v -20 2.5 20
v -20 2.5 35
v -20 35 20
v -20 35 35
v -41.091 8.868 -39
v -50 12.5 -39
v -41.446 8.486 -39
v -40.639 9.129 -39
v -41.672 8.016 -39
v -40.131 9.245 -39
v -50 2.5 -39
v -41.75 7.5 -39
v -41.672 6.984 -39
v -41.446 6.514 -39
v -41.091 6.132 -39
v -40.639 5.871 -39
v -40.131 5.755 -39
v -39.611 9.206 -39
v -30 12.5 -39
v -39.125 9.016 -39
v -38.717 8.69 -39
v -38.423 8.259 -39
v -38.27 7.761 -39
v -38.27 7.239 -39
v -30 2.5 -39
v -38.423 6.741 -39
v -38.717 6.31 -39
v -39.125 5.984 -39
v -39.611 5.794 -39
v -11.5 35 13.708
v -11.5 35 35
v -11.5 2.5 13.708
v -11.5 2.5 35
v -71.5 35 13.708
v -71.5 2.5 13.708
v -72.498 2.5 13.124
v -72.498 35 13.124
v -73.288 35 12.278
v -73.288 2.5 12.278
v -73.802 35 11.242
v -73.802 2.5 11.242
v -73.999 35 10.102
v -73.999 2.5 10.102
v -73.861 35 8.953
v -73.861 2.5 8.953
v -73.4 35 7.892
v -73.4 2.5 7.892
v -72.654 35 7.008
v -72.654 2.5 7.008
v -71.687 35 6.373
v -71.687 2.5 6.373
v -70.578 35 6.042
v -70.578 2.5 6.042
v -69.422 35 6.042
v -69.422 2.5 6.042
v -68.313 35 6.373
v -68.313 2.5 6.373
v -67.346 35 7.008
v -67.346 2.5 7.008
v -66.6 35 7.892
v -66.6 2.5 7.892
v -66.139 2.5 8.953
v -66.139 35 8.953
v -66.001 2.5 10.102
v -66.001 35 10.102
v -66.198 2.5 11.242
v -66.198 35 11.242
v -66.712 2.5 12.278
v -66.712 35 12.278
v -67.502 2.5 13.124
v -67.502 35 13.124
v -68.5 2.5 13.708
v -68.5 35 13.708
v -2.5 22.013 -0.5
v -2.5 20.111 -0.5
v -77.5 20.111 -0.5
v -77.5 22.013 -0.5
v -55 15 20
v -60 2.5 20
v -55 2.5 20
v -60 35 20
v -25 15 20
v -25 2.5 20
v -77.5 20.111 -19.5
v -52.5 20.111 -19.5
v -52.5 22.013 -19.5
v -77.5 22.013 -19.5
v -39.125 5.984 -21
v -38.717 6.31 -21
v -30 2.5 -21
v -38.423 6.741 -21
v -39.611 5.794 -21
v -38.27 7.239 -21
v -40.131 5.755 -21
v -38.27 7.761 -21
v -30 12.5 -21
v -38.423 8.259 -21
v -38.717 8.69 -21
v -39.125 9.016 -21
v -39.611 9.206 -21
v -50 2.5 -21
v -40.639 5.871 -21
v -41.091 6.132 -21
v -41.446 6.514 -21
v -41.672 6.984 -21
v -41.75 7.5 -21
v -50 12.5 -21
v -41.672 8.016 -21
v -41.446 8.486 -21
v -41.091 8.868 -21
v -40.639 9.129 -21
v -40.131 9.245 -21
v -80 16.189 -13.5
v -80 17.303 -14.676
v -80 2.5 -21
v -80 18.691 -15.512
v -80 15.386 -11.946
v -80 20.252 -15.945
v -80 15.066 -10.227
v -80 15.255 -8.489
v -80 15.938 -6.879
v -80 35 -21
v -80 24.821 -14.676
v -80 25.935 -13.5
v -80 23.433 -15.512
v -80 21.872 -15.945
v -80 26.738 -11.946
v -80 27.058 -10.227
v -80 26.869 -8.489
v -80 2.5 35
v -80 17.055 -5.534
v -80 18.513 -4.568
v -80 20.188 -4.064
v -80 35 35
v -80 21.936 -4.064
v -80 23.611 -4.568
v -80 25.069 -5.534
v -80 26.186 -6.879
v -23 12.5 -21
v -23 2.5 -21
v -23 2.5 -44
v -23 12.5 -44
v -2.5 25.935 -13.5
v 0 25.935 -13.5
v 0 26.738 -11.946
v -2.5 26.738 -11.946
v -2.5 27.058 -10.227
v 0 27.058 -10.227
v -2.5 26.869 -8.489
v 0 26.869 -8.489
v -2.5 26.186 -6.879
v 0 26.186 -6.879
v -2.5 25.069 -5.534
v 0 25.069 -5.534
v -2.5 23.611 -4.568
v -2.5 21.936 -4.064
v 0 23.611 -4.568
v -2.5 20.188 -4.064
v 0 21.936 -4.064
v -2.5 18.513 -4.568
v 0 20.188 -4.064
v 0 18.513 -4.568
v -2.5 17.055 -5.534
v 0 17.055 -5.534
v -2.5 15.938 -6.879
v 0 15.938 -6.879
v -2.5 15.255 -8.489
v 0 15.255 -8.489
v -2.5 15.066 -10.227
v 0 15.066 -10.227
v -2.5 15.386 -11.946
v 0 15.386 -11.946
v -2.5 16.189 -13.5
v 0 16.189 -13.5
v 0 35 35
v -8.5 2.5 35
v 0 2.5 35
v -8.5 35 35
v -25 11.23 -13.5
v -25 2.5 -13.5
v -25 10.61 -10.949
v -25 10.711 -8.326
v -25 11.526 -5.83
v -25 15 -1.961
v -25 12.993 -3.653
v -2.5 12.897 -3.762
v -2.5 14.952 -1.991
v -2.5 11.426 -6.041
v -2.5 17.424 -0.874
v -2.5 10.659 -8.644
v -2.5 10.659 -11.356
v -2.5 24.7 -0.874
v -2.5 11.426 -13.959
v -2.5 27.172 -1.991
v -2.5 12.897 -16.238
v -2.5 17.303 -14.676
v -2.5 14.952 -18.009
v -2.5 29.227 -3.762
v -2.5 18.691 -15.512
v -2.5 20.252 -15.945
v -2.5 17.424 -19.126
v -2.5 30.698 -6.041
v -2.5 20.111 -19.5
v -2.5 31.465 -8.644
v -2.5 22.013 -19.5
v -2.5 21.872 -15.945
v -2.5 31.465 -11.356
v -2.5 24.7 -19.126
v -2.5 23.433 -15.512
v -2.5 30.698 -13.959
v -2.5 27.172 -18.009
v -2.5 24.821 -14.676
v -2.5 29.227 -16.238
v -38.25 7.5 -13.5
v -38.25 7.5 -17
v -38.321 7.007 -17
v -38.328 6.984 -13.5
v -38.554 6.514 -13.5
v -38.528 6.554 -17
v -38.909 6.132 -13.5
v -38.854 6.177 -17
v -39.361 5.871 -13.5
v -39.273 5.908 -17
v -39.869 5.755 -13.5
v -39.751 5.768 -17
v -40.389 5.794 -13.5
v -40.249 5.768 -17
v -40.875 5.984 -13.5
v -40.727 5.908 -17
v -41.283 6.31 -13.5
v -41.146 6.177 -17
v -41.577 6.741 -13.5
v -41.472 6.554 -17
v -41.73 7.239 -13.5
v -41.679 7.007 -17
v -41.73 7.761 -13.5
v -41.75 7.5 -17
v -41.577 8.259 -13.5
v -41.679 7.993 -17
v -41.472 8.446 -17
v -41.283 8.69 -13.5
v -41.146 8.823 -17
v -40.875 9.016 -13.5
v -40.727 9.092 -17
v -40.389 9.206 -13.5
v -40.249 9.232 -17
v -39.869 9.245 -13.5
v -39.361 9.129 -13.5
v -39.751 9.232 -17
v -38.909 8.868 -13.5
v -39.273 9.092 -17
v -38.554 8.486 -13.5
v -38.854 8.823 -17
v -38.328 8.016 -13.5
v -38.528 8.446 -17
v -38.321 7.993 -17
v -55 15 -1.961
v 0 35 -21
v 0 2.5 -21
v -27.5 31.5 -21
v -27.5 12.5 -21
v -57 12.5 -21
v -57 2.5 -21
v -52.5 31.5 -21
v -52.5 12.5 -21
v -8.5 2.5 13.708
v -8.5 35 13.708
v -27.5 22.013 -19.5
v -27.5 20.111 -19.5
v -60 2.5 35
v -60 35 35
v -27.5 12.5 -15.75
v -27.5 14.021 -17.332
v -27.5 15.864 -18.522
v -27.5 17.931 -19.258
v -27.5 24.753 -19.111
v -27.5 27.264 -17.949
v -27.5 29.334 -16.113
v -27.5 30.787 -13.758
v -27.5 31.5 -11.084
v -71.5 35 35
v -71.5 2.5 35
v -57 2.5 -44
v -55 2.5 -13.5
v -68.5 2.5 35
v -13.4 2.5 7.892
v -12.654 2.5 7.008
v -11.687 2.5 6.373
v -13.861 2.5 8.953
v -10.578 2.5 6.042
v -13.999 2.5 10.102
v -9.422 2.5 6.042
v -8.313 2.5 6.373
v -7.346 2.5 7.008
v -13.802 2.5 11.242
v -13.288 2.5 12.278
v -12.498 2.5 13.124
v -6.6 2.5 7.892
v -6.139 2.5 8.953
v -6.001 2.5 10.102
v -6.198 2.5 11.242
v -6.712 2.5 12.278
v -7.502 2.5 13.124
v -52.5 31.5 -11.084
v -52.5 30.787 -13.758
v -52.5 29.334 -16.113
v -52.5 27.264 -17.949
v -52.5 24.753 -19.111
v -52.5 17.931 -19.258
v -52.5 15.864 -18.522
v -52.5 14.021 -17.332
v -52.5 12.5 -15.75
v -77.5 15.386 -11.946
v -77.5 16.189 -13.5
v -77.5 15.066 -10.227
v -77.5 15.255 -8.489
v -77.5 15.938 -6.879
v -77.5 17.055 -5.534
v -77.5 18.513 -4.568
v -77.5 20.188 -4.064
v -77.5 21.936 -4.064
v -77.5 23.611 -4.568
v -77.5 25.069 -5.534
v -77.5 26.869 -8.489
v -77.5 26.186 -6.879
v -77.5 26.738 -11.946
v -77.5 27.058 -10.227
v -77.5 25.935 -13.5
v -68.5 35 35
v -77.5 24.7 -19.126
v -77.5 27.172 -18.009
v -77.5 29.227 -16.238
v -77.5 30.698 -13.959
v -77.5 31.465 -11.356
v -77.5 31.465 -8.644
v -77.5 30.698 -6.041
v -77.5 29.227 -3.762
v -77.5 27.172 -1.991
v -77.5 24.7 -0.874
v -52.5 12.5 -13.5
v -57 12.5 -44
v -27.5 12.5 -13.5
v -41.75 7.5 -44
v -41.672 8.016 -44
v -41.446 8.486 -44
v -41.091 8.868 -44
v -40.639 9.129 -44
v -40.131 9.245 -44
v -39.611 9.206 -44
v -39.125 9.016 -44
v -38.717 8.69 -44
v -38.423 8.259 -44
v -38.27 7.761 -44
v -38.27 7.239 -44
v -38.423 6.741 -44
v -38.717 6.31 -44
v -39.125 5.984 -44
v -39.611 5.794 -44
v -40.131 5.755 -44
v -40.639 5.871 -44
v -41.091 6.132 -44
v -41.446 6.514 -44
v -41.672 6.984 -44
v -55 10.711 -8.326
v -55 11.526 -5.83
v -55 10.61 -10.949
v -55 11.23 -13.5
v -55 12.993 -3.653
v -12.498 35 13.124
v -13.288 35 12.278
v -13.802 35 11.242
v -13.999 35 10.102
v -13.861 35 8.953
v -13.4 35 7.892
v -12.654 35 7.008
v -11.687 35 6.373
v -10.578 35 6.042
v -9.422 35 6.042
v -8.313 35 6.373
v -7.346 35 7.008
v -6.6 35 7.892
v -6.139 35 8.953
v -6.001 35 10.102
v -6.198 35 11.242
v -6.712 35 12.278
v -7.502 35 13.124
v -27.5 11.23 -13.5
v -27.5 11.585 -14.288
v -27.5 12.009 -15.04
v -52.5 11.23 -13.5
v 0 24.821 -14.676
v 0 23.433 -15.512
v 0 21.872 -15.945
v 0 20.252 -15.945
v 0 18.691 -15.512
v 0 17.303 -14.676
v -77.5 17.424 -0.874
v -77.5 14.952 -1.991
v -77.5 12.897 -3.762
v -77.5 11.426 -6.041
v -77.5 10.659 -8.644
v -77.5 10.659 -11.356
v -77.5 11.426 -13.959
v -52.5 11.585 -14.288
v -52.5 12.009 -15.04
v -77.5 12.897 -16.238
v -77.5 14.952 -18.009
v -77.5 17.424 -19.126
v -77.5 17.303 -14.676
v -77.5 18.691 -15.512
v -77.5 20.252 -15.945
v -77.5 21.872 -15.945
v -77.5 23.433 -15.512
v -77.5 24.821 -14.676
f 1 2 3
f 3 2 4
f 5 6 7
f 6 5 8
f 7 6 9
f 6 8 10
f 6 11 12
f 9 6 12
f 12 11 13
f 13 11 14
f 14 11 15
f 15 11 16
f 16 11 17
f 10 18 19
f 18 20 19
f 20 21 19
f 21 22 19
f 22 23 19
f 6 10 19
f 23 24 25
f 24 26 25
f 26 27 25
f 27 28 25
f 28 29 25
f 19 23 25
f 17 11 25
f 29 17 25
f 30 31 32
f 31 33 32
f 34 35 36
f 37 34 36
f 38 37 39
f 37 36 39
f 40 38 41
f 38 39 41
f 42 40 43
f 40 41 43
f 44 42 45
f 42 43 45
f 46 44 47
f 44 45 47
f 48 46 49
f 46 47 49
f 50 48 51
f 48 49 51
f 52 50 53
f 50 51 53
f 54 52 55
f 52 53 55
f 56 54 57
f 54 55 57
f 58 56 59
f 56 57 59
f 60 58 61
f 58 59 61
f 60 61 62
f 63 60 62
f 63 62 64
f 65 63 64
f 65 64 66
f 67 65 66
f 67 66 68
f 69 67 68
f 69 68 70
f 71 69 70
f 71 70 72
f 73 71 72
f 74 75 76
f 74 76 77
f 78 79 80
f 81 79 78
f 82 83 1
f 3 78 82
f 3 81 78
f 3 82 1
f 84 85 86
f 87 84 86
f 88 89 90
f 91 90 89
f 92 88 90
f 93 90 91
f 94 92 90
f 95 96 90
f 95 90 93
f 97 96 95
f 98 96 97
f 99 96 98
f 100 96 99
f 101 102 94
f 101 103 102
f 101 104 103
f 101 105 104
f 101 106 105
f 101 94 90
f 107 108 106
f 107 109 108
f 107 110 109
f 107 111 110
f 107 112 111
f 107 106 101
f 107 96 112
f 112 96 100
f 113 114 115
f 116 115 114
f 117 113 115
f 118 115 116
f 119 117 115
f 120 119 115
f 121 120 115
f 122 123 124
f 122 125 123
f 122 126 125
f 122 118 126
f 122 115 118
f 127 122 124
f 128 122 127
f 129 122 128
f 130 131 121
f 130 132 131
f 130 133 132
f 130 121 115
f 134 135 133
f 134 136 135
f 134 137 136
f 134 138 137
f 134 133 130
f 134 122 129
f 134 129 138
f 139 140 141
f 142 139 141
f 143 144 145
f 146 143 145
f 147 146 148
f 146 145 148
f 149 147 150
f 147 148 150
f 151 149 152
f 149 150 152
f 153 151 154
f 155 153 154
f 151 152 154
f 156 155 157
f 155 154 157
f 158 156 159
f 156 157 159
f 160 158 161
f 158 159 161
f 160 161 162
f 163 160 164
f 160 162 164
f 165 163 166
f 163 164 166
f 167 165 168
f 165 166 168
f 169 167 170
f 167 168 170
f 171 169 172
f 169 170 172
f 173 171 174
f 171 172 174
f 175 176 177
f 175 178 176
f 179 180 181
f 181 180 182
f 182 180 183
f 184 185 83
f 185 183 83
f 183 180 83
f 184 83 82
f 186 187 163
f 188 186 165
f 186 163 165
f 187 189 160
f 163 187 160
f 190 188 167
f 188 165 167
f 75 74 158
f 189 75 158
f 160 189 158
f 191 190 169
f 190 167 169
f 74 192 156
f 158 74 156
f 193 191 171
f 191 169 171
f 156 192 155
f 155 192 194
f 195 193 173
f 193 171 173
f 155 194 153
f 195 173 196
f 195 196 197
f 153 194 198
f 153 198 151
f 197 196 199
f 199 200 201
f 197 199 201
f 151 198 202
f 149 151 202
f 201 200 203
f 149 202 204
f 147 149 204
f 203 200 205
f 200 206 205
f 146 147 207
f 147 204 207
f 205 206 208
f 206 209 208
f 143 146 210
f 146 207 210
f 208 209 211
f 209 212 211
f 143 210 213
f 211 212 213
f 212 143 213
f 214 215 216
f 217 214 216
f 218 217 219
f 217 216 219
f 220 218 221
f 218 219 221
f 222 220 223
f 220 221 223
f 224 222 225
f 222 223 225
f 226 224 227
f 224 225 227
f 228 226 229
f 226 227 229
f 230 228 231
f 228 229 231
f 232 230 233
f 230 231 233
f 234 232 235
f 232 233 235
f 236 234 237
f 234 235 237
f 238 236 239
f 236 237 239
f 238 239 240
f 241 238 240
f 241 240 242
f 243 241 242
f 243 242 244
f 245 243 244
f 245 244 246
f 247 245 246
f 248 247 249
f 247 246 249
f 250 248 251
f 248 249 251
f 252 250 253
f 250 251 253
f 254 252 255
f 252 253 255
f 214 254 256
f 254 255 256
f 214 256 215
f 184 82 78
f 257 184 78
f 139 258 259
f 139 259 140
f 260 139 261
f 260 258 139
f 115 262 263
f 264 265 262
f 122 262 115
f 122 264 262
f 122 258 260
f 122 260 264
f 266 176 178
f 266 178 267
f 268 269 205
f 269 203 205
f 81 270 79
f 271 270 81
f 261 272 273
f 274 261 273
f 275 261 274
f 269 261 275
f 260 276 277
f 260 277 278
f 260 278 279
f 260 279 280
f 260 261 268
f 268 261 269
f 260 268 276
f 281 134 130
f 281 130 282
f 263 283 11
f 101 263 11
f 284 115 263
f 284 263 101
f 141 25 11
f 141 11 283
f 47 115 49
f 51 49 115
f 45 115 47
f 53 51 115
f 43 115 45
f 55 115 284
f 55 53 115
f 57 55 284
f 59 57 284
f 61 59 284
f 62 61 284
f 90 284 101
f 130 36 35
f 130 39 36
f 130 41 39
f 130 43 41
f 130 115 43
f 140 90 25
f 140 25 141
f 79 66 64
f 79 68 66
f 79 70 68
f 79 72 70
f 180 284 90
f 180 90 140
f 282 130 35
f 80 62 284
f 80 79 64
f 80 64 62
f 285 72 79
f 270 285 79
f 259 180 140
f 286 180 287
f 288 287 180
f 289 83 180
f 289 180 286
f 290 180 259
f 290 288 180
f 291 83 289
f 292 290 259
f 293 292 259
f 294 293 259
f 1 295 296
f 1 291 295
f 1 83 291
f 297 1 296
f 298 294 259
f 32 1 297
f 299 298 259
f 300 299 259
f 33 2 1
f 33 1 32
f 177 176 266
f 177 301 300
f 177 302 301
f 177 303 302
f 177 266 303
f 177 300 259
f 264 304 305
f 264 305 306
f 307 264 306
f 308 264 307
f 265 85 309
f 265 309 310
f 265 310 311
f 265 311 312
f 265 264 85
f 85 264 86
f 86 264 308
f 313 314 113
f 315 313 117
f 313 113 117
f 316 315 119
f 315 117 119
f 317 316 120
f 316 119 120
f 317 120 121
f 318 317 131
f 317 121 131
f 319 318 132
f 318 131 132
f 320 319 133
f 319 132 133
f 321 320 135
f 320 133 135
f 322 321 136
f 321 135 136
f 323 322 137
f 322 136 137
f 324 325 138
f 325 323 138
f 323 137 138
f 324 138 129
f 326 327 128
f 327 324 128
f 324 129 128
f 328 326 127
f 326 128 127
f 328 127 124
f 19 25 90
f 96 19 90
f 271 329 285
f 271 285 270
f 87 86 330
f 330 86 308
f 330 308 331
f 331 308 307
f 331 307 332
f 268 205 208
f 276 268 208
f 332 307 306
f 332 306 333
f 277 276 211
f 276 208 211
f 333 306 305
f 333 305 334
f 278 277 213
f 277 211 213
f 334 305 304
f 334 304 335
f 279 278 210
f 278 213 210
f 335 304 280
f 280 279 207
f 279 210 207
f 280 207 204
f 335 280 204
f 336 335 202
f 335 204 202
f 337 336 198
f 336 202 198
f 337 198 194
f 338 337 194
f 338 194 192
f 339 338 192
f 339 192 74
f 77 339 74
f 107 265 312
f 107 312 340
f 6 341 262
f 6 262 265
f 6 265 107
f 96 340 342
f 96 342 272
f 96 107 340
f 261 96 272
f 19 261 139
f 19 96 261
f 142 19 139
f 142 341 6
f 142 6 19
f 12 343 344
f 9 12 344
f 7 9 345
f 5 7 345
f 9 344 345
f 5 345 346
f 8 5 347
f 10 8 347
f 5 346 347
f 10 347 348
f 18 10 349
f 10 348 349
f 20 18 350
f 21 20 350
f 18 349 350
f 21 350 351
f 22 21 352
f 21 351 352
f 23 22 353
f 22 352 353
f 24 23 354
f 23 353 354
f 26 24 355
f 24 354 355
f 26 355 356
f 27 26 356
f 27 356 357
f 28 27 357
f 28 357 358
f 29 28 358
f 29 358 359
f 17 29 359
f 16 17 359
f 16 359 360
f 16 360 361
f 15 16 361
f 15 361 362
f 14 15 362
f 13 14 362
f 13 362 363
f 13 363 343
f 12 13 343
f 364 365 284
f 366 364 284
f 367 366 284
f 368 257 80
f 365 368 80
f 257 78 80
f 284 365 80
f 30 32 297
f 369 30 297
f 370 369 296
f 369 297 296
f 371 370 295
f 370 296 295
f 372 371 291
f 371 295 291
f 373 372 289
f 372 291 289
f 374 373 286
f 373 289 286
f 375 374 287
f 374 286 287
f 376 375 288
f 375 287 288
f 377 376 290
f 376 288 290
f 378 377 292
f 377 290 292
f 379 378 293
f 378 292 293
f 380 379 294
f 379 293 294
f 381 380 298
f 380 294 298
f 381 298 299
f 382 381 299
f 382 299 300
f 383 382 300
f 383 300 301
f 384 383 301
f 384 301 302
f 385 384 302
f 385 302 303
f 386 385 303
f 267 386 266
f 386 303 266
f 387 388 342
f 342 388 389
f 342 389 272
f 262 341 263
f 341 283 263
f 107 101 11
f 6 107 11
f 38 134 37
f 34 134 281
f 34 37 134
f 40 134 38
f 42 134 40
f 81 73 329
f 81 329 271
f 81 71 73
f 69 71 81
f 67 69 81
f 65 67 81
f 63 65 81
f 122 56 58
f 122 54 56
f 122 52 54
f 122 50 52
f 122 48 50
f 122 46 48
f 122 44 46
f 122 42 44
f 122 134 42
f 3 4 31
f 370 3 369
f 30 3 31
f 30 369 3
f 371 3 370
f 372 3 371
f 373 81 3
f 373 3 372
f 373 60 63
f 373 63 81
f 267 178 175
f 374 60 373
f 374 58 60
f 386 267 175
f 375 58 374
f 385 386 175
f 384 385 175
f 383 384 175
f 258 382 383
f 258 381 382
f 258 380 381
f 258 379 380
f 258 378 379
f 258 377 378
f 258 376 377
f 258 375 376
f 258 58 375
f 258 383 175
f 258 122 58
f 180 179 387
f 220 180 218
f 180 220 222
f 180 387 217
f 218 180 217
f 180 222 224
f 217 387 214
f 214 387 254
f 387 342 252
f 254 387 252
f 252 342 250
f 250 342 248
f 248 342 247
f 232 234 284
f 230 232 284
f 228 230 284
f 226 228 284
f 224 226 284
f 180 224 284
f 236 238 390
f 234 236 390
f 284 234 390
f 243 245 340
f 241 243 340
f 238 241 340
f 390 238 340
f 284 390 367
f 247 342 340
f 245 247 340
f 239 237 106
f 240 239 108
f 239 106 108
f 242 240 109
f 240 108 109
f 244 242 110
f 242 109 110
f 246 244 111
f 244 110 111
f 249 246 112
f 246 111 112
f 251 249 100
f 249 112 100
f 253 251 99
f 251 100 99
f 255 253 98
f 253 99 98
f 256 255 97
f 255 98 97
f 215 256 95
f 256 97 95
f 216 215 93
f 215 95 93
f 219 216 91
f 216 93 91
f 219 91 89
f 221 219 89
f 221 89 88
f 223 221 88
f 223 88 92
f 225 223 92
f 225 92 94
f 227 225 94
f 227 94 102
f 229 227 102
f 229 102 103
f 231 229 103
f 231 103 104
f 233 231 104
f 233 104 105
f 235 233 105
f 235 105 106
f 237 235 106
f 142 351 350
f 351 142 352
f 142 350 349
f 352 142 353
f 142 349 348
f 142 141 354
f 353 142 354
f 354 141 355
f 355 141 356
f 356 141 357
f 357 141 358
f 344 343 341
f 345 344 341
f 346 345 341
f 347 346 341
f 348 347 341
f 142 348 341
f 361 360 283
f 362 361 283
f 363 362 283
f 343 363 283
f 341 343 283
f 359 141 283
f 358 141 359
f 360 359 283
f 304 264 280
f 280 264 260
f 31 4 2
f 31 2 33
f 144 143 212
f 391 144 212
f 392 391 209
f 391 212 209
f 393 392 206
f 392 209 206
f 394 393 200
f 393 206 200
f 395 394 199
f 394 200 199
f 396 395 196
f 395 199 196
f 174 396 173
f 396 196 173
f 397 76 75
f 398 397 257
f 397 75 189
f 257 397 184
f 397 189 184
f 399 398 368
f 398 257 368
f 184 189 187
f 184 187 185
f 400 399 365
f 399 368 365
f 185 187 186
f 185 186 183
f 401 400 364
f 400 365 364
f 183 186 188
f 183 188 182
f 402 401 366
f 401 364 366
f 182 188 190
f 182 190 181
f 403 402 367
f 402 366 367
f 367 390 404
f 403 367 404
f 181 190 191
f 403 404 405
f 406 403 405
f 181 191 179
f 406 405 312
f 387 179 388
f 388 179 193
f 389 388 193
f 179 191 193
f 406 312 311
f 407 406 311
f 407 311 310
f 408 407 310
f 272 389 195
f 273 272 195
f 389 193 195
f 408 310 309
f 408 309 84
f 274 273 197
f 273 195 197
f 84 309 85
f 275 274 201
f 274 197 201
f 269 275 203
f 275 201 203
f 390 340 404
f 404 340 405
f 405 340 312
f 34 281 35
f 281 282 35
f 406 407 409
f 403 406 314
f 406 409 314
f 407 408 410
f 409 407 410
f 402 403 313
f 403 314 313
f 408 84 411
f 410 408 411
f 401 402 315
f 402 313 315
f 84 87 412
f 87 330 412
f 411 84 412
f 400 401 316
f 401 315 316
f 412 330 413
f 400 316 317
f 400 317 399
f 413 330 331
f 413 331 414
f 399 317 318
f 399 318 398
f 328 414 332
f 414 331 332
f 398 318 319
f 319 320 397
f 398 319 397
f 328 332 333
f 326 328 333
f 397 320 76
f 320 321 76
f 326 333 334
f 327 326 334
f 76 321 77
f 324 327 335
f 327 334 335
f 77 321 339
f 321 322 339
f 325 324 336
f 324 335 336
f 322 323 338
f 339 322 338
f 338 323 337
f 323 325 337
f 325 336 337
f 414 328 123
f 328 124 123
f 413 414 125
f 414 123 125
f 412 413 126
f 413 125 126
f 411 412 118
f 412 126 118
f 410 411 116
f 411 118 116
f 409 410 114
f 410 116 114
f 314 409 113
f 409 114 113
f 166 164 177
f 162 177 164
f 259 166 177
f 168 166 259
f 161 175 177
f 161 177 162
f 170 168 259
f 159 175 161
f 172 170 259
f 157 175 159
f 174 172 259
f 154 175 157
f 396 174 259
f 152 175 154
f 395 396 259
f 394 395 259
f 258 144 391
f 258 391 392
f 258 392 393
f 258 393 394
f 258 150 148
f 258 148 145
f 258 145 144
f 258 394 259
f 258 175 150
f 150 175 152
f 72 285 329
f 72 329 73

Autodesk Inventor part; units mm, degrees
ref_plane "YZ Plane" through (0, 0, 0) normal (1, 0, 0) x (0, 1, 0)
ref_plane "XZ Plane" through (0, 0, 0) normal (0, 1, 0) x (-1, 0, 0)
sketch "Sketch1" plane through (0, 0, 0) normal (0, 1, 0) x (-1, 0, 0)
  arc A0 (8.5, 13.7081) -> (11.5, 13.7081) centre (10, 10) ccw
  line L0 (8.5, 20) -> (8.5, 13.7081)
  line L1 (11.5, 20) -> (11.5, 13.7081)
  line L2 (10, 20) -> (10, 18.7339)
  line L3 (20, 20) -> (10, 20)
  line L4 (8.5, 20) -> (0, 20)
  line L5 (0, 20) -> (0, 0)
  line L6 (0, 0) -> (20, 0)
  line L7 (20, 0) -> (20, 20)
  arc A1 (68.5, 13.7081) -> (71.5, 13.7081) centre (70, 10) ccw
  line L8 (68.5, 20) -> (68.5, 13.7081)
  line L9 (71.5, 20) -> (71.5, 13.7081)
  line L10 (70, 20) -> (70, 18.3732)
  line L11 (80, 20) -> (70, 20)
  line L12 (68.5, 20) -> (60.9559, 20)
  line L13 (60.9559, 20) -> (60.9559, 0)
  line L14 (60.9559, 0) -> (80, 0)
  line L15 (80, 0) -> (80, 20)
  line L16 (60.9559, 0) -> (20, 0)
  line L17 (20, 0) -> (20, 20)
  line L18 (20, 20) -> (60.9559, 20)
  line L19 (60.9559, 20) -> (60.9559, 0)
  dimension "d2" = 8
  dimension "d7" = 1.5
  dimension "d8" = 1.5
  dimension "d16" = 10
  dimension "d17" = 8
  dimension "d18" = 1.5
  dimension "d19" = 1.5
  dimension "d20" = 10
  dimension "d22" = 80
  dimension "d23" = 10
  dimension "d24" = 0
  dimension "d25" = 60
  dimension "d26" = 20
  dimension "d27" = 20
  dimension "d28" = 20
  dimension "d29" = 20
  dimension "d30" = 10
  dimension "d31" = 10
  dimension "d32" = 20
extrude "Extrusion1" add sketch "Sketch1" along normal blind 36
sketch "Sketch5" plane through (-80, 0, 0) normal (-1, 0, 0) x (0, 0, 1)
  line L0 (20, 0) -> (20, 36) projected
  line L1 (20, 36) -> (-15, 36)
  line L2 (-15, 6) -> (20, 6)
  line L3 (20, 6) -> (20, 36)
  line L4 (-15, 36) -> (-15, 29.1398)
  line L5 (-15, 12.9843) -> (-15, 6)
  line L6 (0, 0) -> (0, 36) projected
  line L7 (0, 0) -> (0, 36) projected
  line L8 (0, 6) -> (0, 36)
  arc A0 (-15, 12.9843) -> (-15, 29.1398) centre (-10, 21.062) ccw
  dimension "d40" = 30
  dimension "d41" = 35
  dimension "d45" = 20
  dimension "d85" = 19
  dimension "d86" = 5
  dimension "d87" = 15
extrude "Extrusion5" add sketch "Sketch5" against normal blind 80 contours L2 L5 A0 L4 L1 L6
sketch "Sketch13" plane through (0, 36, 0) normal (0, 1, 0) x (1, 0, 0)
  line L0 (-80, -20) -> (-80, 15) projected
  line L1 (-80, -20) -> (-71.5, -20) projected
  line L2 (-71.5, -20) -> (-71.5, -13.7081) projected
  arc A0 (-68.5, -13.7081) -> (-71.5, -13.7081) centre (-70, -10) ccw projected
  line L3 (-68.5, -13.7081) -> (-68.5, -20) projected
  line L4 (-68.5, -20) -> (-11.5, -20) projected
  line L5 (-11.5, -20) -> (-11.5, -13.7081) projected
  arc A1 (-8.5, -13.7081) -> (-11.5, -13.7081) centre (-10, -10) ccw projected
  line L6 (-8.5, -13.7081) -> (-8.5, -20) projected
  line L7 (-8.5, -20) -> (0, -20) projected
  line L8 (0, -20) -> (0, 15) projected
  line L9 (-80, 15) -> (0, 15) projected
  point P0 (0, 0)
extrude "Extrusion11" cut sketch "Sketch13" against normal blind 1
sketch "Sketch16" plane through (-80, 6, -15) normal (0, 0, -1) x (-1, 0, 0)
  line L0 (-80, -6) -> (0, -6) projected
  line L1 (0, 6.9843) -> (-80, 6.9843) projected
  line L2 (-80, -6) -> (0, -6)
  line L3 (0, -6) -> (0, 6.9843)
  line L4 (0, 6.9843) -> (-80, 6.9843)
  line L5 (-80, 6.9843) -> (-80, -6)
  line L6 (0, -6) -> (0, 29) projected
  line L7 (0, 23.1398) -> (-80, 23.1398) projected
  line L8 (0, 29) -> (-80, 29)
  line L9 (-80, 29) -> (-80, 23.1398)
  line L10 (-80, 23.1398) -> (0, 23.1398)
  line L11 (0, 23.1398) -> (0, 29)
extrude "Extrusion13" add sketch "Sketch16" along normal blind 6
sketch "Sketch17" plane through (0, 0, 0) normal (0, 0, -1) x (-1, 0, 0)
  line L0 (80, 6) -> (0, 6) projected
  line L1 (0, 0) -> (80, 0) projected
  line L2 (80, 6) -> (0, 6) projected
  line L3 (80, 6) -> (80, 0)
  line L4 (0, 6) -> (0, 0)
extrude "Extrusion14" add sketch "Sketch17" along normal blind 20
sketch "Sketch18" plane through (-68.5, 0, 20) normal (0, 0, 1) x (1, 0, 0)
  line L0 (13.5, 0) -> (43.5, 0)
  line L1 (43.5, 0) -> (43.5, 15)
  line L2 (43.5, 15) -> (13.5, 15)
  line L3 (13.5, 15) -> (13.5, 0)
  line L4 (-11.5, 0) -> (-11.5, 35) projected
  line L5 (0, 0) -> (57, 0) projected
  point P0 (68.5, 0)
  dimension "d107" = 30
  dimension "d108" = 25
  dimension "d109" = 15
  dimension "d110" = 0
extrude "Extrusion15" cut sketch "Sketch18" against normal blind 37
sketch "Sketch19" plane through (0, 0, 0) normal (0, -1, 0) x (1, 0, 0)
  line L0 (-80, -21) -> (0, -21) projected
  line L1 (-30, -21) -> (-23, -21)
  line L2 (-23, -21) -> (-23, -44)
  line L3 (-23, -44) -> (-30, -44)
  line L4 (-30, -44) -> (-30, -21)
  line L5 (-30, -44) -> (-50, -44)
  line L6 (-50, -44) -> (-50, -39)
  line L7 (-50, -39) -> (-30, -39)
  line L8 (-30, -39) -> (-30, -44)
  line L9 (-50, -44) -> (-57, -44)
  line L10 (-57, -44) -> (-57, -21)
  line L11 (-57, -21) -> (-50, -21)
  line L12 (-50, -21) -> (-50, -44)
  line L13 (0, -21) -> (0, 20) projected
  point P0 (0, 0)
  dimension "d113" = 7
  dimension "d114" = 7
  dimension "d115" = 5
  dimension "d116" = 18
  dimension "d117" = 20
  dimension "d118" = 23
extrude "Extrusion16" add sketch "Sketch19" against normal blind 15.5 contours L0 L12 L6 L9 L10 | L0 L2 L3 L4 | L7 L4 L5 L6
sketch "Sketch20" plane through (-23, 0, -44) normal (0, 0, -1) x (-1, 0, 0)
  circle A0 centre (17, 7.5) radius 1.75
  line L0 (34, 0) -> (0, 0) projected
  line L1 (-23, 12.9843) -> (-23, 0) projected
  dimension "d121" = 3.5
  dimension "d122" = 7.5
  dimension "d123" = 40
extrude "Extrusion17" cut sketch "Sketch20" against normal blind 80
sketch "Sketch21" plane through (0, 0, 0) normal (0, -1, 0) x (1, 0, 0)
  line L0 (0, -0.5) -> (-80, -0.5) projected
  line L1 (0, -21) -> (-23, -21) projected
  line L2 (0, -21) -> (0, 20) projected
  line L3 (0, 20) -> (-8.5, 20) projected
  line L4 (-8.5, 20) -> (-8.5, 13.7081) projected
  arc A0 (-11.5, 13.7081) -> (-8.5, 13.7081) centre (-10, 10) ccw projected
  line L5 (-11.5, 13.7081) -> (-11.5, 20) projected
  line L6 (-25, 20) -> (-11.5, 20) projected
  line L7 (-25, 20) -> (-25, -17) projected
  line L8 (-25, -17) -> (-55, -17) projected
  line L9 (-55, -17) -> (-55, 20) projected
  line L10 (-68.5, 20) -> (-55, 20) projected
  line L11 (-68.5, 13.7081) -> (-68.5, 20) projected
  arc A1 (-71.5, 13.7081) -> (-68.5, 13.7081) centre (-70, 10) ccw projected
  line L12 (-71.5, 20) -> (-71.5, 13.7081) projected
  line L13 (-80, 20) -> (-71.5, 20) projected
  line L14 (-80, 20) -> (-80, -21) projected
  line L15 (-57, -21) -> (-80, -21) projected
  line L16 (-57, -21) -> (-57, -44) projected
  line L17 (-57, -44) -> (-23, -44) projected
  line L18 (-23, -44) -> (-23, -21) projected
  line L19 (-30, -21) -> (-30, -39) projected
  line L20 (-30, -39) -> (-50, -39) projected
  line L21 (-50, -39) -> (-50, -21) projected
  line L22 (-30, -21) -> (-50, -21) projected
  point P0 (0, 0)
extrude "Extrusion18" cut sketch "Sketch21" against normal blind 2.5 contours L2 L1 L18 L17 L16 L15 L14 L0 L9 L8 L7 | L0 L7 L6 L5 A0 L4 L3 L2 | L0 L14 L13 L12 A1 L11 L10 L9 | L19 L20 L21 L22
ref_plane "Work Plane5" through (-40, 21.062, -10) normal (-1, 0, 0) x (0, 0, 1)
sketch "Sketch25" plane through (-80, 6, -21) normal (0, 0, -1) x (-1, 0, 0)
  line L0 (-80, 6.9843) -> (-80, -3.5) projected
  line L1 (0, 29) -> (-80, 29) projected
  line L2 (-80, -3.5) -> (-52.5, -3.5)
  line L3 (-52.5, -3.5) -> (-52.5, 29)
  line L4 (-52.5, 29) -> (-80, 29)
  line L5 (-80, 29) -> (-80, -3.5)
  line L6 (0, 23.1398) -> (0, 29) projected
  line L7 (0, 29) -> (-27.5, 29)
  line L8 (-27.5, 29) -> (-27.5, -1)
  line L9 (-27.5, -1) -> (0, -1)
  line L10 (0, -1) -> (0, 29)
  point P0 (-80, -6)
  dimension "d138" = 27.5
  dimension "d139" = 27.5
  dimension "d140" = 30
extrude "Extrusion21" add sketch "Sketch25" against normal blind 7.5
sketch "Sketch22" plane through (-40, 21.062, -10) normal (-1, 0, 0) x (0, 0, 1)
  arc A0 (-9.4999, -0.9509) -> (9.4999, -0.9509) centre (0, -1) ccw
  arc A1 (9.4999, 0.9509) -> (-9.4999, 0.9509) centre (0, 1) ccw
  line L0 (9.4999, -0.9509) -> (9.4999, 1.0491)
  line L1 (-9.4999, -0.9509) -> (-9.4999, 1.0491)
  point P0 (0, 0)
  dimension "d170" = 1
  dimension "d171" = 1
  dimension "d172" = 19
  dimension "d173" = 19
extrude "Extrusion19" cut sketch "Sketch22" along normal mid plane 75
sketch "Sketch24" plane through (-80, 6, -21) normal (0, 0, -1) x (-1, 0, 0)
  line L0 (0, 29) -> (-80, 29) projected
  line L1 (-27.5, 29) -> (-52.5, 29)
  line L2 (-52.5, 29) -> (-52.5, 4.062)
  line L3 (-52.5, 4.062) -> (-27.5, 4.062)
  line L4 (-27.5, 4.062) -> (-27.5, 29)
  line L5 (0, 23.1398) -> (0, 29) projected
  line L6 (-80, 6.9843) -> (-80, -3.5) projected
  line L7 (-52.5, 29) -> (-80, 29)
  line L8 (-80, 29) -> (-80, -3.5)
  line L9 (-80, -3.5) -> (-52.5, -3.5)
  line L10 (-52.5, -3.5) -> (-52.5, 29)
  line L11 (0, -3.5) -> (0, 6.9843) projected
  line L12 (-27.5, 29) -> (0, 29)
  line L13 (0, 29) -> (0, -3.5)
  line L14 (0, -3.5) -> (-27.5, -3.5)
  line L15 (-27.5, -3.5) -> (-27.5, 29)
  line L16 (-27.5, 25.5) -> (-52.5, 25.5)
  line L17 (-52.5, 25.5) -> (-52.5, 6.5)
  line L18 (-52.5, 6.5) -> (-27.5, 6.5)
  line L19 (-27.5, 6.5) -> (-27.5, 25.5)
  line L20 (-77.5, 25.562) -> (-2.5, 25.562) projected
  point P0 (-80, -6)
  point P1 (-52.5, 6.5)
  point P2 (-27.5, 6.5)
  point P3 (-27.5, 25.5)
  point P4 (-52.5, 25.5)
  dimension "d133" = 25
  dimension "d134" = 27.5
  dimension "d174" = 3.5
  dimension "d175" = 19
extrude "Extrusion20" cut sketch "Sketch24" against normal blind 10 contours L4 L18 L2 L16
sketch "Sketch26" plane through (0, 35, 20) normal (1, 0, 0) x (0, 0, -1)
  arc A0 (33.5, -5.1062) -> (33.5, -22.7697) centre (30, -13.938) ccw projected
  circle A1 centre (30, -13.938) radius 6
  line L0 (41, 0) -> (41, -32.5) projected
  line L1 (0, 0) -> (41, 0) projected
  line L2 (0, -32.5) -> (0, 0) projected
  line L3 (0, -32.5) -> (41, -32.5) projected
  line L4 (33.5, -22.7697) -> (33.5, -5.1062) projected
  arc A2 (33.5, -5.1062) -> (33.5, -22.7697) centre (30, -13.938) ccw projected
  point P0 (20, -35)
  point P1 (35, -8.3478)
  point P2 (35, -19.5282)
  dimension "d143" = 12
extrude "Extrusion22" add sketch "Sketch26" against normal blind 2.5 contours L4 A1 A0
sketch "Sketch27" plane through (-80, 35, -21) normal (-1, 0, 0) x (0, 0, 1)
  arc A0 (7.5, -22.7697) -> (7.5, -5.1062) centre (11, -13.938) ccw projected
  line L0 (7.5, -5.1062) -> (7.5, -22.7697) projected
  line L1 (0, -32.5) -> (0, 0) projected
  line L2 (0, -32.5) -> (41, -32.5) projected
  line L3 (41, -32.5) -> (41, 0) projected
  line L4 (41, 0) -> (0, 0) projected
  circle A1 centre (11, -13.938) radius 6
  point P0 (21, -35)
extrude "Extrusion23" add sketch "Sketch27" against normal blind 2.5 contours L0 A1 A0
sketch "Sketch28" plane through (-80, 6, -21) normal (0, 0, -1) x (-1, 0, 0)
  line L0 (-77.5, 23.062) -> (-2.5, 23.062) projected
  line L1 (-57.32, 23.062) -> (-20.6249, 23.062)
  line L2 (-20.6249, 23.062) -> (-20.6249, 8)
  line L3 (-20.6249, 8) -> (-57.32, 8)
  line L4 (-57.32, 8) -> (-57.32, 23.062)
  line L5 (-57, 9.5) -> (-23, 9.5) projected
  point P0 (-80, -6)
  dimension "d152" = 1.5
extrude "Extrusion24" cut sketch "Sketch28" along normal blind 30.5
sketch "Sketch29" plane through (-80, 35, -21) normal (-1, 0, 0) x (0, 0, 1)
  arc A0 (7.5, -18.8114) -> (7.5, -9.0646) centre (11, -13.938) ccw projected
  circle A1 centre (11, -13.938) radius 6
  point P0 (21, -35)
  point P1 (7.5, -9.0646)
  point P2 (7.5, -18.8114)
extrude "Extrusion25" cut sketch "Sketch29" against normal blind 100.5
sketch "Sketch30" plane through (-68.5, 35, 20) normal (0, 0, 1) x (1, 0, 0)
  line L0 (-11.5, -32.5) -> (-3, -32.5) projected
  line L1 (-3, -32.5) -> (-3, 0) projected
  line L2 (-3, 0) -> (-11.5, 0) projected
  line L3 (-11.5, -32.5) -> (-11.5, 0) projected
  line L4 (0, -32.5) -> (13.5, -32.5) projected
  line L5 (13.5, -32.5) -> (13.5, -20) projected
  line L6 (13.5, -20) -> (43.5, -20) projected
  line L7 (43.5, -20) -> (43.5, -32.5) projected
  line L8 (43.5, -32.5) -> (57, -32.5) projected
  line L9 (57, -32.5) -> (57, 0) projected
  line L10 (57, 0) -> (0, 0) projected
  line L11 (0, -32.5) -> (0, 0) projected
  line L12 (60, -32.5) -> (68.5, -32.5) projected
  line L13 (68.5, -32.5) -> (68.5, 0) projected
  line L14 (68.5, 0) -> (60, 0) projected
  line L15 (60, -32.5) -> (60, 0) projected
  point P0 (68.5, -35)
extrude "Extrusion26" add sketch "Sketch30" along normal blind 15
sketch "Sketch31" plane through (-68.5, 35, 35) normal (0, 0, 1) x (1, 0, 0)
  line L0 (-11.5, 0) -> (68.5, 0) projected
  line L1 (43.5, -32.5) -> (57, -32.5) projected
  line L2 (8.5, 0) -> (50.25, 0)
  line L3 (50.25, 0) -> (50.25, -32.5)
  line L4 (50.25, -32.5) -> (8.5, -32.5)
  line L5 (8.5, -32.5) -> (8.5, 0)
  line L6 (-11.5, 0) -> (-11.5, -32.5) projected
  line L7 (48.5, -32.5) -> (48.5, 0)
  line L8 (68.5, -32.5) -> (68.5, 0) projected
  point P0 (68.5, -35)
  dimension "d157" = 20
  dimension "d158" = 20
extrude "Extrusion27" cut sketch "Sketch31" against normal blind 15 contours L0 L7 L1 L4 L5
sketch "Sketch32" plane through (-68.5, 0, -17) normal (0, 0, 1) x (1, 0, 0)
  line L0 (38.5, 12.5) -> (38.5, 2.5) projected
  line L1 (16, 12.5) -> (16, 5) projected
  line L2 (16, 5) -> (13.5, 5) projected
  line L3 (13.5, 2.5) -> (13.5, 5) projected
  line L4 (13.5, 2.5) -> (41, 2.5) projected
  line L5 (41, 2.5) -> (41, 12.5) projected
  circle A0 centre (28.5, 7.5) radius 1.75 projected
  line L6 (41, 12.5) -> (16, 12.5) projected
  point P0 (68.5, 0)
  point P1 (38.5, 14)
  point P2 (38.5, 12.9843)
extrude "Extrusion28" add sketch "Sketch32" along normal up to surface (3.5 mm away)
sketch "Sketch33" plane through (-27.5, 14, -21) normal (0, 1, 0) x (1, 0, 0)
  line L0 (-2.5, 0) -> (-2.5, 18) projected
  line L1 (0, 0) -> (-2.5, 0) projected
  line L2 (4.5, 0) -> (0, 0) projected
  line L3 (4.5, 23) -> (4.5, 0) projected
  line L4 (-29.5, 23) -> (4.5, 23) projected
  line L5 (-29.5, 0) -> (-29.5, 23) projected
  line L6 (-25, 0) -> (-29.5, 0) projected
  line L7 (-22.5, 0) -> (-25, 0) projected
  line L8 (-22.5, 18) -> (-22.5, 0) projected
  line L9 (-2.5, 18) -> (-22.5, 18) projected
  point P0 (27.5, -21)
extrude "Extrusion29" cut sketch "Sketch33" against normal blind 1.5
equation "\"d2\" = RodDiameter"
equation "\"d17\" = d2"
equation "\"d85\" = XLinearBearingOD"
equation "\"d139\" = d138"
equation "\"d172\" = XLinearBearingOD"
equation "\"d173\" = XLinearBearingOD"
equation "\"d175\" = XLinearBearingOD"
equation "\"RodDiameter\" = 8"
equation "\"VerticalBearingOD\" = 16"
equation "\"PrintingClearance\" = 0.2"
equation "\"d21\" = 8"
equation "\"TubeID\" = 18"
equation "\"XLinearBearingOD\" = 19"
properties part number "GantryHolder" material "PET Plastic"
